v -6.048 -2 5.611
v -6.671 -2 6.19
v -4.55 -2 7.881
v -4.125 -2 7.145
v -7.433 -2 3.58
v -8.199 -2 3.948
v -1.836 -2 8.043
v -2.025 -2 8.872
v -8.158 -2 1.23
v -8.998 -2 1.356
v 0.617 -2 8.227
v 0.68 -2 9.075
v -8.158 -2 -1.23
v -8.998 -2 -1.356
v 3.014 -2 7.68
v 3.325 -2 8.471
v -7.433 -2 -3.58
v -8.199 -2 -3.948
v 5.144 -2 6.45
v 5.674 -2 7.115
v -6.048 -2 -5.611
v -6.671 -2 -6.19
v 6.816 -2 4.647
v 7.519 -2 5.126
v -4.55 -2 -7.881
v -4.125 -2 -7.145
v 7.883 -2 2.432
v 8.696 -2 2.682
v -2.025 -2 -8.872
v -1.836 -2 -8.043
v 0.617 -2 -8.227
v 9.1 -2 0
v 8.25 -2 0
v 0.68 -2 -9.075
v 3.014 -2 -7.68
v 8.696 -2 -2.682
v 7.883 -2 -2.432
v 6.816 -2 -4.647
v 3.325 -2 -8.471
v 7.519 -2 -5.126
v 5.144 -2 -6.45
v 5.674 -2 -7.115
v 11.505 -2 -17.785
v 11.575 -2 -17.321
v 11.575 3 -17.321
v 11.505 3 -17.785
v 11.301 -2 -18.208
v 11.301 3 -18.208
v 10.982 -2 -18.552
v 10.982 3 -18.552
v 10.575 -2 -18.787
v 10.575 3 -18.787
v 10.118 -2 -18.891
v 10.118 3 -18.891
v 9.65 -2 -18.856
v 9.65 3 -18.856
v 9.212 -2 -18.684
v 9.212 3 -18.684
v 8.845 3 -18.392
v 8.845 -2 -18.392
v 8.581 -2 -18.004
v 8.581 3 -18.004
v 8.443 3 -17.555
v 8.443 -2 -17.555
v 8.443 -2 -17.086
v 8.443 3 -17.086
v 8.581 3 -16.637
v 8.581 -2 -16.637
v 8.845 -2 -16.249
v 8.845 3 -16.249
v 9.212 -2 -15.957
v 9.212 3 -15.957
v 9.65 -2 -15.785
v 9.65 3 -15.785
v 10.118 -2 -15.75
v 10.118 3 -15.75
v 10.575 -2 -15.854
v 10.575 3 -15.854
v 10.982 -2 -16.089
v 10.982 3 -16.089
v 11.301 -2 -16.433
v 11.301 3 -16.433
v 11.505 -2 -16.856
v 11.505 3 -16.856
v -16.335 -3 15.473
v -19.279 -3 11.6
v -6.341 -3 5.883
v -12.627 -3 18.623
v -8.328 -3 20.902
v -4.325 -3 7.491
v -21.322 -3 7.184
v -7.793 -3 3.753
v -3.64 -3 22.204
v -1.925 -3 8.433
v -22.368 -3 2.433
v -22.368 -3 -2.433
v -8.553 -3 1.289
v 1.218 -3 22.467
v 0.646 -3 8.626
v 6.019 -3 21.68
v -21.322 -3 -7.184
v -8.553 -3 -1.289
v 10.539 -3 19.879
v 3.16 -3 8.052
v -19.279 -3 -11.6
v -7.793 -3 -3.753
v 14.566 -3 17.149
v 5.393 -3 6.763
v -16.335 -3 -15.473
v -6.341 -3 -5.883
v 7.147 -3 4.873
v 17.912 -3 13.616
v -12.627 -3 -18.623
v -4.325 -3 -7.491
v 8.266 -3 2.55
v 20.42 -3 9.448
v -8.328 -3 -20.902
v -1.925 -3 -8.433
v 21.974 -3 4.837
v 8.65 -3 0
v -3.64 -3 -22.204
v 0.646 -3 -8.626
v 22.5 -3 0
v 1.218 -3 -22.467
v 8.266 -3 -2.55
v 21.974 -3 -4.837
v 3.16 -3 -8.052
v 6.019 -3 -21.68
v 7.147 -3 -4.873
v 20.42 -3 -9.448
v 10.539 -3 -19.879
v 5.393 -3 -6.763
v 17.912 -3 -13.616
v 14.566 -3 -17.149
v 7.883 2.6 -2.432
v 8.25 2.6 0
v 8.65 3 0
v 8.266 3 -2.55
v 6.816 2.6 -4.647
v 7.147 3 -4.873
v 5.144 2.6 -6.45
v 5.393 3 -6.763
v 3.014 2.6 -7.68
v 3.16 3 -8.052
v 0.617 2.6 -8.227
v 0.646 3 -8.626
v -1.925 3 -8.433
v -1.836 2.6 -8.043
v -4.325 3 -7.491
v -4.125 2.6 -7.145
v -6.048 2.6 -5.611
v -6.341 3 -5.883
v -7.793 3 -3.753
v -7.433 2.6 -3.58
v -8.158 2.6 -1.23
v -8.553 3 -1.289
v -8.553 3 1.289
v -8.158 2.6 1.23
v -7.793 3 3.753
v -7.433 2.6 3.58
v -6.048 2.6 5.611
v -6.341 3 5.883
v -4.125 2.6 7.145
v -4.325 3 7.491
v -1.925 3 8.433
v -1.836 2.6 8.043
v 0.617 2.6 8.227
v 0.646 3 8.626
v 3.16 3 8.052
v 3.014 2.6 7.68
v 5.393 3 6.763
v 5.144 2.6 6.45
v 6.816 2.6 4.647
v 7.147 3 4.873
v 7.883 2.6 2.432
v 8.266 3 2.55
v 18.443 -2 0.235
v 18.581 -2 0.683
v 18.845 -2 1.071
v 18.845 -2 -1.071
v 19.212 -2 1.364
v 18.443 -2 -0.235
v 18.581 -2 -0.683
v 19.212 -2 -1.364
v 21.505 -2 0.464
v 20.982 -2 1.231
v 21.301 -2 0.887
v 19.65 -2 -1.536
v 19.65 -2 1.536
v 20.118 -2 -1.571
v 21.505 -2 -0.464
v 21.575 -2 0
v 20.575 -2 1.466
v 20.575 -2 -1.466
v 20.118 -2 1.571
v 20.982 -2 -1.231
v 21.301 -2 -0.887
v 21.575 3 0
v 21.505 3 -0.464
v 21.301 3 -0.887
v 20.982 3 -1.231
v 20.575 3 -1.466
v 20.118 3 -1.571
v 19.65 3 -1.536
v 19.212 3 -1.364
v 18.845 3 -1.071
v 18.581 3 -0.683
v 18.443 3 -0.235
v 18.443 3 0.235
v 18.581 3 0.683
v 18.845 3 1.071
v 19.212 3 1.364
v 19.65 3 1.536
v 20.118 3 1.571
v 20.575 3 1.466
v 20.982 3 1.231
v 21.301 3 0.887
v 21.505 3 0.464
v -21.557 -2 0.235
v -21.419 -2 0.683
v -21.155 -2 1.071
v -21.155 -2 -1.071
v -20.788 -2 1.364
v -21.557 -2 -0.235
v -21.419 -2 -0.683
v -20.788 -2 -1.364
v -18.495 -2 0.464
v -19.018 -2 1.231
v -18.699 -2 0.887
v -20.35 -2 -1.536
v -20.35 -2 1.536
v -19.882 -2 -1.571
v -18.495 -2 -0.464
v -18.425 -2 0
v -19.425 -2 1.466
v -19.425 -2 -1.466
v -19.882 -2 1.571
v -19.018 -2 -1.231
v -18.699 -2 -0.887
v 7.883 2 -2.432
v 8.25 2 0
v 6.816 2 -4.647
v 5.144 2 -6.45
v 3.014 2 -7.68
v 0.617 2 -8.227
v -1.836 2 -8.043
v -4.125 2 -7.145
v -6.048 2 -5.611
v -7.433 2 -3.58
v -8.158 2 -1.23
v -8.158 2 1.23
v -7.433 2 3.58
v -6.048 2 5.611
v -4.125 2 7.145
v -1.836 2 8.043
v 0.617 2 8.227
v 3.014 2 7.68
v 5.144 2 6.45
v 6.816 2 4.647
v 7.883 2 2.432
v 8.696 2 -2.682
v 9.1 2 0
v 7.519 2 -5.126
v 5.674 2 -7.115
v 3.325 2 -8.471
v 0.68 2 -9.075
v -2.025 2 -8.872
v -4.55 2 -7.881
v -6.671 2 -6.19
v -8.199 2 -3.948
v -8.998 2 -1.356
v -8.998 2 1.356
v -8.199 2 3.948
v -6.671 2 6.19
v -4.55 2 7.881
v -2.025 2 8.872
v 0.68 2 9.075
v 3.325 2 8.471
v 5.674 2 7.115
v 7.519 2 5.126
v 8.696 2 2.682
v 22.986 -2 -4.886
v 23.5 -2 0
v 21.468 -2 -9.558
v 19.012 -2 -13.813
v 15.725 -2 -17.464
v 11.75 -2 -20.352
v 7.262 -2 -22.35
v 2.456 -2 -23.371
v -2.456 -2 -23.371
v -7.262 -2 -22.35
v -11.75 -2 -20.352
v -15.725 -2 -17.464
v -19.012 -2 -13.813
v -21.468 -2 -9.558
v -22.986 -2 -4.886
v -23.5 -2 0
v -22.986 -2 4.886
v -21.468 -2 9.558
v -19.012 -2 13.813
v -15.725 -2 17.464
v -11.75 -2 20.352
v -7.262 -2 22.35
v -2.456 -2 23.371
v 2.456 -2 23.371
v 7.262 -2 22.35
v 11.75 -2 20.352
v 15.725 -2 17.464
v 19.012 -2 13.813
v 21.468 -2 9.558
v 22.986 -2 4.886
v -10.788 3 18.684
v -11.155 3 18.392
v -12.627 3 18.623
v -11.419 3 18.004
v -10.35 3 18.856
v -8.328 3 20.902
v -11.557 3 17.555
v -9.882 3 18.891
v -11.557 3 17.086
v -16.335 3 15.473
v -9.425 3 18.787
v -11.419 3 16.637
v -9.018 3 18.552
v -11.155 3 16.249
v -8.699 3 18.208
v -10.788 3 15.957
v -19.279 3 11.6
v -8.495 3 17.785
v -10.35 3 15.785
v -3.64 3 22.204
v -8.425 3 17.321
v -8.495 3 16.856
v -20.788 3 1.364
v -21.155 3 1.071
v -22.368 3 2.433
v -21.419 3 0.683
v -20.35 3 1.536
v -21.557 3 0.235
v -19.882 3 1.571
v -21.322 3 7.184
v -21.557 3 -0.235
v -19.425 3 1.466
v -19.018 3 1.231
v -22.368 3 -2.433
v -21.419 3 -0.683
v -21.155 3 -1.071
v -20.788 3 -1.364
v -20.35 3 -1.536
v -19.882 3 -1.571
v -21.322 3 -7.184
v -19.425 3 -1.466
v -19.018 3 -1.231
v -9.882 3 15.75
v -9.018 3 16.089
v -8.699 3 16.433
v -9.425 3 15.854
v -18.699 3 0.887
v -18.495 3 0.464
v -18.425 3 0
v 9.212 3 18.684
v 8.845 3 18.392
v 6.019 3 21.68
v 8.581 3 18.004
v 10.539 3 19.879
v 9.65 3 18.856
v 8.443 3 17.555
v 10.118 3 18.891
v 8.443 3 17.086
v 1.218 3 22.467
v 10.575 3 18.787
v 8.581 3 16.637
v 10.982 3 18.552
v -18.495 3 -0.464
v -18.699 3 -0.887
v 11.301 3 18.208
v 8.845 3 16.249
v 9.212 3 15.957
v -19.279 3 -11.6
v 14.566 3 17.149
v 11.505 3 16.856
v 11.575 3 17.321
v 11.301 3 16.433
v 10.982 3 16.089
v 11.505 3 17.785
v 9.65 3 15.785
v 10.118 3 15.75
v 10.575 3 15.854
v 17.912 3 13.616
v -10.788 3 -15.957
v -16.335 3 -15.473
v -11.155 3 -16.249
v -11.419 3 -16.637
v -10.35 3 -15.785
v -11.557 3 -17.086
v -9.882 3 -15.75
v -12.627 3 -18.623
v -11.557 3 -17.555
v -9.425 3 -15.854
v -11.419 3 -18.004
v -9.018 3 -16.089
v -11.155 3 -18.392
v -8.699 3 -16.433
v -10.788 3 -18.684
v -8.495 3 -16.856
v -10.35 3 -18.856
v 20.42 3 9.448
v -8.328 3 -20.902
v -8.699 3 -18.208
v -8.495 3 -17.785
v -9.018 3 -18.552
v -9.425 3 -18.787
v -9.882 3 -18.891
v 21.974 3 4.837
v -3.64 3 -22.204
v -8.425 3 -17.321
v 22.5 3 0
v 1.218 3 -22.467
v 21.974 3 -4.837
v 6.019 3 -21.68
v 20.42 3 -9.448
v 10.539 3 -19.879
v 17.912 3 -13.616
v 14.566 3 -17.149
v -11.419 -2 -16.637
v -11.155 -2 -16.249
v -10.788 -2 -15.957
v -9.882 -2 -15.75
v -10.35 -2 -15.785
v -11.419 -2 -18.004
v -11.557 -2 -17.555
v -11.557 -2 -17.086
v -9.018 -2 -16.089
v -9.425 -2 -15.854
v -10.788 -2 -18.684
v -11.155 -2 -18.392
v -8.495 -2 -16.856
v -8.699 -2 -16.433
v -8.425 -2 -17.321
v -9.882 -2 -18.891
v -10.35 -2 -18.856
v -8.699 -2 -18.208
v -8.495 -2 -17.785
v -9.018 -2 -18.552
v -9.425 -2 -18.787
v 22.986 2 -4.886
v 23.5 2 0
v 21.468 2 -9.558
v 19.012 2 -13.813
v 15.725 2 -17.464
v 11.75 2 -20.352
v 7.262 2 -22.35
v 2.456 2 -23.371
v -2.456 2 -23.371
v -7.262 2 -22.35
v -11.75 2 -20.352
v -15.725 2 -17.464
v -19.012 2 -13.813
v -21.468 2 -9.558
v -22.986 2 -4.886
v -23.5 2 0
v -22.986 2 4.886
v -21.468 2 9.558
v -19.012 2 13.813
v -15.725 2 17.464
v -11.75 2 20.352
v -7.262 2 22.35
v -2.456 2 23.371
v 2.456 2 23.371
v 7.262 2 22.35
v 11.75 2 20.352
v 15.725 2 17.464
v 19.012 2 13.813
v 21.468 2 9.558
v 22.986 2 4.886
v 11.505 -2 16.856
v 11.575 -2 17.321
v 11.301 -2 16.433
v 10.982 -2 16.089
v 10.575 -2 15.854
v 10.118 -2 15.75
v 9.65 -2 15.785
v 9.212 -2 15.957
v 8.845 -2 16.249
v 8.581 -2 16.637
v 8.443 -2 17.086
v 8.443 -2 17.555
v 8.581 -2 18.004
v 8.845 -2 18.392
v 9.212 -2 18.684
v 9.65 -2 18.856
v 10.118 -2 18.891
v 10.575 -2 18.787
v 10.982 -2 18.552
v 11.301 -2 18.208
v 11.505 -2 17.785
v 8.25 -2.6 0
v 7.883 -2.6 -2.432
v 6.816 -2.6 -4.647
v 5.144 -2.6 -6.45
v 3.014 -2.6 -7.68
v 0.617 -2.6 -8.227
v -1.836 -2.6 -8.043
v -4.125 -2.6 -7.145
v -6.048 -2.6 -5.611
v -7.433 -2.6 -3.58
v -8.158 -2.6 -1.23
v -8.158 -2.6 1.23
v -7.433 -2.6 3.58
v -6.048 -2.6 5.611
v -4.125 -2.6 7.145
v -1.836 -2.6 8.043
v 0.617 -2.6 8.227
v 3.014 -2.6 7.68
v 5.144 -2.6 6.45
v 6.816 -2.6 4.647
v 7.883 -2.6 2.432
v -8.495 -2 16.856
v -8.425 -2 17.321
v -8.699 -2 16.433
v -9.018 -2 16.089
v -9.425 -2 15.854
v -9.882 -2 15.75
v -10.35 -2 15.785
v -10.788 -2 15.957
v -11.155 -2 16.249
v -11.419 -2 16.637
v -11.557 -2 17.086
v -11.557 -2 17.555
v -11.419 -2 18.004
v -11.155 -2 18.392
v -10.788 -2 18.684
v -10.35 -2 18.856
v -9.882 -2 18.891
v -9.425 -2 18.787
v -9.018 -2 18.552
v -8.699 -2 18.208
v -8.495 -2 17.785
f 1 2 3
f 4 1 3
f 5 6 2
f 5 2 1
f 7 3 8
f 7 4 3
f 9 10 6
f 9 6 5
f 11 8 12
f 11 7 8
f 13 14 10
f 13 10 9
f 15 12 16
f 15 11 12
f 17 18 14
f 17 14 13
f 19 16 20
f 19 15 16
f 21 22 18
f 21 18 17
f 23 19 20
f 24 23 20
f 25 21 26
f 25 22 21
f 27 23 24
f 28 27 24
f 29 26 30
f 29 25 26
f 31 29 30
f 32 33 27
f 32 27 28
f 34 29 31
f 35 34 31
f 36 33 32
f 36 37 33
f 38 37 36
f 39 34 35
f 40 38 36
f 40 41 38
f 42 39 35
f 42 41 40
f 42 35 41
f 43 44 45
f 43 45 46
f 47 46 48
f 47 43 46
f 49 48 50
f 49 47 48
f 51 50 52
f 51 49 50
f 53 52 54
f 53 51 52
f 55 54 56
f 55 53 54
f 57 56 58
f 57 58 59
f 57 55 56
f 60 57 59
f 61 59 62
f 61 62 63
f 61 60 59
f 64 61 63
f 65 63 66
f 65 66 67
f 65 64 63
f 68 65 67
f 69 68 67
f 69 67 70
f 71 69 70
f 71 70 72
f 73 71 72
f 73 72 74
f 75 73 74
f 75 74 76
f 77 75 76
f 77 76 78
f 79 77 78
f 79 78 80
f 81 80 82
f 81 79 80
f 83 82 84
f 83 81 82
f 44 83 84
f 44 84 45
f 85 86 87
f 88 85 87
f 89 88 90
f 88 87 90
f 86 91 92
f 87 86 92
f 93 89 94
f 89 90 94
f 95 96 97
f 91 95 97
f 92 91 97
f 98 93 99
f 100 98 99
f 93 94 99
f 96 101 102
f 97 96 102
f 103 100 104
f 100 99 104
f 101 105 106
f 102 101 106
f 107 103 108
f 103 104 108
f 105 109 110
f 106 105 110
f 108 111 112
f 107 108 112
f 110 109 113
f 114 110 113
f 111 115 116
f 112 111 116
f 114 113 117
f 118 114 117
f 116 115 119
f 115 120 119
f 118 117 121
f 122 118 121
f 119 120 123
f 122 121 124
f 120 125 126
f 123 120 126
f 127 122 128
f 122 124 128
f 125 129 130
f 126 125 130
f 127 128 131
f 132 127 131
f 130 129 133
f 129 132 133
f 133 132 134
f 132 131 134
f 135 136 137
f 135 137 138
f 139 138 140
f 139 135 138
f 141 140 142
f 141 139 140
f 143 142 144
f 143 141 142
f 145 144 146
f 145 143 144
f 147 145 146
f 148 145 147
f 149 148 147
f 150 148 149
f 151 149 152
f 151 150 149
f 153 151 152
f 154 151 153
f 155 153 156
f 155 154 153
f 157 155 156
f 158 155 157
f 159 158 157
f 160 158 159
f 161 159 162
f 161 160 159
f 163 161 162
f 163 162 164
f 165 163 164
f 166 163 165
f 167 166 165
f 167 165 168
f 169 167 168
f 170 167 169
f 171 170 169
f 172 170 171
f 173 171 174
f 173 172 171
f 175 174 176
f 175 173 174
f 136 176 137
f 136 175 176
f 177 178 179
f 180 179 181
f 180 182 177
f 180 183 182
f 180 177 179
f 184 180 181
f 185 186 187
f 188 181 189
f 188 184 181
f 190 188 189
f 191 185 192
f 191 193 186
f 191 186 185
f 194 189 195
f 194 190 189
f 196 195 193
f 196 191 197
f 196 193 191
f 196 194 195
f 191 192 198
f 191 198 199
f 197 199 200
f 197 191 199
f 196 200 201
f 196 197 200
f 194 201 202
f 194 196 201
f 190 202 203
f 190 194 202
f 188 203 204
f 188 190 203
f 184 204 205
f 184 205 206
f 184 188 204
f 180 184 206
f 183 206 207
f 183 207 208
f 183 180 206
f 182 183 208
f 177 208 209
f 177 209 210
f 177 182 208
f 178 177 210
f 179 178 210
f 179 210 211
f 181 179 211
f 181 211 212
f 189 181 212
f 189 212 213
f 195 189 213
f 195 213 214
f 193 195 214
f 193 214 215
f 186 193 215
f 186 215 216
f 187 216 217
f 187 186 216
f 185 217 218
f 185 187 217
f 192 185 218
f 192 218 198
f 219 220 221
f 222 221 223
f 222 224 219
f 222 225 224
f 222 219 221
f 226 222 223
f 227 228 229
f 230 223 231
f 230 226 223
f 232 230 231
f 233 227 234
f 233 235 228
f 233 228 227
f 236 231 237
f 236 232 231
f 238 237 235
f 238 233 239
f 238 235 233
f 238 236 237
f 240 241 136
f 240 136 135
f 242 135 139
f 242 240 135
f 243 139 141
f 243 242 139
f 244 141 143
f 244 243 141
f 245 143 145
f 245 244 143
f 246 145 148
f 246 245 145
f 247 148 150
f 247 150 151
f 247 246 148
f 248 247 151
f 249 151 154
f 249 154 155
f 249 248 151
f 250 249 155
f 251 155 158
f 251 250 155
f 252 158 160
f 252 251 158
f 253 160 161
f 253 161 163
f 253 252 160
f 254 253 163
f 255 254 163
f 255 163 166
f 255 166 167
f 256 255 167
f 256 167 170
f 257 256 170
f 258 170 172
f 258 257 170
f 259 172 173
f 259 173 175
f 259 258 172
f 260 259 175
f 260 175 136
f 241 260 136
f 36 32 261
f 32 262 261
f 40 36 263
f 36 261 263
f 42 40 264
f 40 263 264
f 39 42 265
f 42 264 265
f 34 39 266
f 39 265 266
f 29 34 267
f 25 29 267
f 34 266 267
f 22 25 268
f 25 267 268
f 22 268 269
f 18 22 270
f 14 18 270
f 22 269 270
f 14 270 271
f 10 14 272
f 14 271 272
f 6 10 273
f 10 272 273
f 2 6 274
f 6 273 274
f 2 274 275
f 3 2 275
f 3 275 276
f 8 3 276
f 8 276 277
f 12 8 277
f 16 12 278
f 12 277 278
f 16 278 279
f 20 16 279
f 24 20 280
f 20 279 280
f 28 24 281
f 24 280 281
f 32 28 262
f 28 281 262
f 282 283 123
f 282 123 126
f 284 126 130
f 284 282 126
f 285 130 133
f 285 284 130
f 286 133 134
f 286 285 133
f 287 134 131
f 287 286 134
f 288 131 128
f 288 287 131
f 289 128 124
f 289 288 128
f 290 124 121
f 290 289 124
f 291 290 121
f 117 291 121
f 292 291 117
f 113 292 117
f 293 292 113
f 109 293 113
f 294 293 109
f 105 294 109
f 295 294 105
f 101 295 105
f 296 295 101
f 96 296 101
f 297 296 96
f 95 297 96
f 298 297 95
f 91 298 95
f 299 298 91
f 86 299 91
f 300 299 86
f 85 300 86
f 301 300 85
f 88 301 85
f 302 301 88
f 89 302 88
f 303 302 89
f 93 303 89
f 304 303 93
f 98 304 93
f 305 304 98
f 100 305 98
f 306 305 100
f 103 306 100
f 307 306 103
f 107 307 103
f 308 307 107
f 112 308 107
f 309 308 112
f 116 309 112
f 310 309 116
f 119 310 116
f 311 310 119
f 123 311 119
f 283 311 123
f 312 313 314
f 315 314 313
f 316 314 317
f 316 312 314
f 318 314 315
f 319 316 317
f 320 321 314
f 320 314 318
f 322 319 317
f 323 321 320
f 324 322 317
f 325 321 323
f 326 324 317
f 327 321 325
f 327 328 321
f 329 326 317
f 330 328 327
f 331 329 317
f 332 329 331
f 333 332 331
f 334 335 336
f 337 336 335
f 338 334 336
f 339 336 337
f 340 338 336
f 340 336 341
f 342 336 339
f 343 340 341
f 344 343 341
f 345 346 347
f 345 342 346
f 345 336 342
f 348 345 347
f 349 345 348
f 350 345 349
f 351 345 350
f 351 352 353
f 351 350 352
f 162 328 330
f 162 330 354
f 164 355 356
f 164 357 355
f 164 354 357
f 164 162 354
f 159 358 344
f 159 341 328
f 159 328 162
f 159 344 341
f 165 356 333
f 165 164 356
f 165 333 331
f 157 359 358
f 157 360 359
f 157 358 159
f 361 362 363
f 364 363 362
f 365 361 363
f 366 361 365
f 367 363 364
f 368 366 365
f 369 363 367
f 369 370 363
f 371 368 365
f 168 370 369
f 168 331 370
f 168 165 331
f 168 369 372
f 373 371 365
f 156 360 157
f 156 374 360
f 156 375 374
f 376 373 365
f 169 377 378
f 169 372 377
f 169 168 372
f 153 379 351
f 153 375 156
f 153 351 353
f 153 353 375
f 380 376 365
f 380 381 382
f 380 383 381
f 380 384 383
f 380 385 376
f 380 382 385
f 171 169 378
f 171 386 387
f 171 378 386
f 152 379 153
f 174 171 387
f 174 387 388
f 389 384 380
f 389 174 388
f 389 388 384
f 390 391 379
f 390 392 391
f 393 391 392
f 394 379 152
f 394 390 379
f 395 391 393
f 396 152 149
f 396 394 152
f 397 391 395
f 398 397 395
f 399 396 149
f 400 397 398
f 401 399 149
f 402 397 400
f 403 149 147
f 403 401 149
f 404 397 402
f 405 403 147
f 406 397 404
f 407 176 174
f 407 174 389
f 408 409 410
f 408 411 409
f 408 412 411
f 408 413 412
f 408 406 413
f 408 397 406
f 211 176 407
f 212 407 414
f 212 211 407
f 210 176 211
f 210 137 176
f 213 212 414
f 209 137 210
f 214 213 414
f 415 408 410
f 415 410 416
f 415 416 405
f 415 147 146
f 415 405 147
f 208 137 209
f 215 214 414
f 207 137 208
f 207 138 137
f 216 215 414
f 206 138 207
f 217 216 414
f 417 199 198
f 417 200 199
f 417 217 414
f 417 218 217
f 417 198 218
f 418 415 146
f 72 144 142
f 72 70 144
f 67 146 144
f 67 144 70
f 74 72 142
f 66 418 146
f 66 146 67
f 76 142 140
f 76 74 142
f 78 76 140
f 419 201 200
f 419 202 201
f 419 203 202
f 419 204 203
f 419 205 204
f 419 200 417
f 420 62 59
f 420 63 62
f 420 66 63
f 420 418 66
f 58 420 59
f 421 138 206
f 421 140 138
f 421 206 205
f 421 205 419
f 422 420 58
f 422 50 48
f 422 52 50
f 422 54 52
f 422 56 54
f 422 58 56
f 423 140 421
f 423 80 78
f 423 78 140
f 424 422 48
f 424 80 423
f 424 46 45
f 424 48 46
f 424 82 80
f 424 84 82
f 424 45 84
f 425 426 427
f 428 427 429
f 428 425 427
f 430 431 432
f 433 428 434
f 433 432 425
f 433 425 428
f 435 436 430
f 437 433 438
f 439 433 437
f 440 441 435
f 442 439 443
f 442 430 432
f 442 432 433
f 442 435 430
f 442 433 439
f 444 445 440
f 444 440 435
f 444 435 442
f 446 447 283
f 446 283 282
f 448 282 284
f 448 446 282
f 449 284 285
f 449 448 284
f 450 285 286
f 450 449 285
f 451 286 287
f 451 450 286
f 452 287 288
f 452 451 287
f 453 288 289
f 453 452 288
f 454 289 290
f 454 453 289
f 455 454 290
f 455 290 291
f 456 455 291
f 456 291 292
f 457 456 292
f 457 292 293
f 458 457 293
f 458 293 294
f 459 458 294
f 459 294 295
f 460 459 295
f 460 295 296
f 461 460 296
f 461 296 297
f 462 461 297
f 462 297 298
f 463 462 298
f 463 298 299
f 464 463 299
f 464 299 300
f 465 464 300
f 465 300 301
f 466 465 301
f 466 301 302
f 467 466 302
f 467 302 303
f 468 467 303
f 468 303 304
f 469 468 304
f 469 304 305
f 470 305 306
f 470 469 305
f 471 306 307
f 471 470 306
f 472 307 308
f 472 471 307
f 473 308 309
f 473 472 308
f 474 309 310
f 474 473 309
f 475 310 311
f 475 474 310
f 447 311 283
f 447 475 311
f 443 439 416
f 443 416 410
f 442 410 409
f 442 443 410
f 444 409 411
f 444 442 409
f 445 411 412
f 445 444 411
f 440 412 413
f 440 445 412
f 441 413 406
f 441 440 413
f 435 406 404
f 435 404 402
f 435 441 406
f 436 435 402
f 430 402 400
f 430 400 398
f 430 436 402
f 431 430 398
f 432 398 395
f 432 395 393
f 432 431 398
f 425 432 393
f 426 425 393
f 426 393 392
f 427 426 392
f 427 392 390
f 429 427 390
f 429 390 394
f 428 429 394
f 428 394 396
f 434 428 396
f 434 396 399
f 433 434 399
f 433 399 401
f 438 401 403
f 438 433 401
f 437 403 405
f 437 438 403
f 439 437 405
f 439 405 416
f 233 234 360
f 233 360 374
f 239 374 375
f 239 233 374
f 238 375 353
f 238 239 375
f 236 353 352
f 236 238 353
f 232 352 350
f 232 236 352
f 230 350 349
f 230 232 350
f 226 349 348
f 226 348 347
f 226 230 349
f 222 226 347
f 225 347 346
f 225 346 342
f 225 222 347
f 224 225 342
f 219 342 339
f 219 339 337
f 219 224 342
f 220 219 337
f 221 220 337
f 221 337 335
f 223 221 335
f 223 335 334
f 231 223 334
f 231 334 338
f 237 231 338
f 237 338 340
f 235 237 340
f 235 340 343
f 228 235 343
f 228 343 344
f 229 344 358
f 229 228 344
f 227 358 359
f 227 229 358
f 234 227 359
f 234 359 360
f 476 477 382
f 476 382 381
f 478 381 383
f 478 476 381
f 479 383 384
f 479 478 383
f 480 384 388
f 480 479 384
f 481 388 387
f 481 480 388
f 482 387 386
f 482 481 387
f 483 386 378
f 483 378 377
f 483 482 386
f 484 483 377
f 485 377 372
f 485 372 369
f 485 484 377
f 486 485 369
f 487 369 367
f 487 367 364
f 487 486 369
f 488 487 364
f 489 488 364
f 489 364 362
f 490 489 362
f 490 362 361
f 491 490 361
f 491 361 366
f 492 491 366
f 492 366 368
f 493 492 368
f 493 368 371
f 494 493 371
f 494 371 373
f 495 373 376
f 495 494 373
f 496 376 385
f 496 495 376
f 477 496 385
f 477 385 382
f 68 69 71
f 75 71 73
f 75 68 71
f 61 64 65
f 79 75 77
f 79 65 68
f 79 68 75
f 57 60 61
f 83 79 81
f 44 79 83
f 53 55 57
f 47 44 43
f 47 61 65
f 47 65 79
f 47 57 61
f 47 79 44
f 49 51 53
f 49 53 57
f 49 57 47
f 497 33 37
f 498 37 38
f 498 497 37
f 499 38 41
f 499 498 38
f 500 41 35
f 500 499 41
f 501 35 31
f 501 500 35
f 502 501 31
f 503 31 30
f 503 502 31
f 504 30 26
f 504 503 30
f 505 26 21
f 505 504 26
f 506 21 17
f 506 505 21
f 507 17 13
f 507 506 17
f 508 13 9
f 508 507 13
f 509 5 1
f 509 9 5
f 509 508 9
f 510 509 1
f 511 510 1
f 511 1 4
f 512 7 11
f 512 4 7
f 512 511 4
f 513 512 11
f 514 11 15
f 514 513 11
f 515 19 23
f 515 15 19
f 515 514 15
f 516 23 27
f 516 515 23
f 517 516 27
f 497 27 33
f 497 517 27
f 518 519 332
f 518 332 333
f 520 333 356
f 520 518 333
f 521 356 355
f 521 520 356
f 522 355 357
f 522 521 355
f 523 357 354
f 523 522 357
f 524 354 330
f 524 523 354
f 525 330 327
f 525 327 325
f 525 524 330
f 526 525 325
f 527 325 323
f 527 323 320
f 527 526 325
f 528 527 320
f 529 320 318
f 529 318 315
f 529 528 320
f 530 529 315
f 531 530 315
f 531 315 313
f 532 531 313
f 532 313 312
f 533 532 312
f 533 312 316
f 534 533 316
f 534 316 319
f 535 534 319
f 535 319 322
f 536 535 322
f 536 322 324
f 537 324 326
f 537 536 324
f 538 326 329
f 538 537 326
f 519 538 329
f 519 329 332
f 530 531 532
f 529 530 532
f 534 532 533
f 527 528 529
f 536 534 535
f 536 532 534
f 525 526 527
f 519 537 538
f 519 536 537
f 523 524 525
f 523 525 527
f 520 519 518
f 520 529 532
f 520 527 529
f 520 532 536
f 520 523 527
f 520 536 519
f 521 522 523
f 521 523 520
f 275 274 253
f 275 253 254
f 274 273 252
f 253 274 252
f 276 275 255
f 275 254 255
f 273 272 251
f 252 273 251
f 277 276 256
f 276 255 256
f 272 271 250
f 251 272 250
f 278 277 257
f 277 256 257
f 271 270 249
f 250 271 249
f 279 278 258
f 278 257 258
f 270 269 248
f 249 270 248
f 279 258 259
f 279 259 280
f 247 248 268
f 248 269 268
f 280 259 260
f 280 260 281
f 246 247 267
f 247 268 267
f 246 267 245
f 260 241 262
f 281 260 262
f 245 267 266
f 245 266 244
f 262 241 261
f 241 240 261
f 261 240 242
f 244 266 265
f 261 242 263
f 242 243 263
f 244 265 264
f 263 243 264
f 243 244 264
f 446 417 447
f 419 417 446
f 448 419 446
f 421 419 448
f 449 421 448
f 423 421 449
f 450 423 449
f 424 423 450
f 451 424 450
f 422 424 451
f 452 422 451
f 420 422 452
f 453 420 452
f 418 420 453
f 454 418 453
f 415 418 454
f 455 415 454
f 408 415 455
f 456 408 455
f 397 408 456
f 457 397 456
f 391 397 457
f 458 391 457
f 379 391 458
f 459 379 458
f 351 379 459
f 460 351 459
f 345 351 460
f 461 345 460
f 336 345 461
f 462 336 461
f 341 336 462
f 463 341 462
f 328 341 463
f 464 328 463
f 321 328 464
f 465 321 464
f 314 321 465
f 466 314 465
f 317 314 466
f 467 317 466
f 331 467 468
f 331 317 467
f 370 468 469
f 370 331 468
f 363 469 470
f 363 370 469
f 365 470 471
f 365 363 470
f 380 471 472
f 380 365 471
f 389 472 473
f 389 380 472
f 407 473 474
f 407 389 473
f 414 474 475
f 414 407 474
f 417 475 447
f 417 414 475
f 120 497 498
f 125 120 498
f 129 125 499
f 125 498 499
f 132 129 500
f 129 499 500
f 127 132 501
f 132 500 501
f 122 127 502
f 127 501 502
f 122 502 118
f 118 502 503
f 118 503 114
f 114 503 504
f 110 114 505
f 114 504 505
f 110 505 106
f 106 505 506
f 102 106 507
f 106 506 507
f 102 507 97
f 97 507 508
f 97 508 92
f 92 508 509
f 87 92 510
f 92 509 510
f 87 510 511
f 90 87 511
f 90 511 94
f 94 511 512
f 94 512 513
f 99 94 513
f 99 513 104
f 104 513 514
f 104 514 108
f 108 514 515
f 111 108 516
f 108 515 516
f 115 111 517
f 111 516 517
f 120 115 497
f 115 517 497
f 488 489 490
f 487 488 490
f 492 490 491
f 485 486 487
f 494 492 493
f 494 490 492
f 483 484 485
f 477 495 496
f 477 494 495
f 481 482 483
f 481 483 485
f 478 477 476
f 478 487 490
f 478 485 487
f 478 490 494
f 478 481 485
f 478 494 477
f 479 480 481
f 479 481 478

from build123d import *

# Parameters (mm, degrees)
SKETCH1_R           = 23.5
SKETCH1_R_2         = 1.575
SKETCH1_R_3         = 8.25
BOSS_EXTRUDE1_DEPTH = 3
SKETCH2_R           = 9.1
CUT_EXTRUDE1_DEPTH  = 2
SKETCH3_R           = 21.575
SKETCH3_R_2         = 18.425
BOSS_EXTRUDE2_DEPTH = 1
CHAMFER1_SIZE       = 1
CHAMFER2_SIZE       = 0.4


with BuildPart() as part:
    # Sketch1 → Boss-Extrude1 (new body, symmetric)
    with BuildSketch(Plane(origin=(0, 0, 0), x_dir=(1, 0, 0), z_dir=(0, 1, 0))):
        Circle(SKETCH1_R)
        with Locations((20, 0)):
            Circle(SKETCH1_R_2, mode=Mode.SUBTRACT)
        with Locations((10, -17.320508076)):
            Circle(SKETCH1_R_2, mode=Mode.SUBTRACT)
        with Locations((-10, -17.320508076)):
            Circle(SKETCH1_R_2, mode=Mode.SUBTRACT)
        with Locations((-20, 0)):
            Circle(SKETCH1_R_2, mode=Mode.SUBTRACT)
        with Locations((-10, 17.320508076)):
            Circle(SKETCH1_R_2, mode=Mode.SUBTRACT)
        with Locations((10, 17.320508076)):
            Circle(SKETCH1_R_2, mode=Mode.SUBTRACT)
        Circle(SKETCH1_R_3, mode=Mode.SUBTRACT)
    extrude(amount=BOSS_EXTRUDE1_DEPTH, both=True)

    # Sketch2 → Cut-Extrude1 (cut, symmetric)
    with BuildSketch(Plane(origin=(0, 0, 0), x_dir=(1, 0, 0), z_dir=(0, 1, 0))):
        Circle(SKETCH2_R)
    extrude(amount=CUT_EXTRUDE1_DEPTH, both=True, mode=Mode.SUBTRACT)

    # Sketch3 → Boss-Extrude2 (add)
    with BuildSketch(Plane(origin=(0, -3, 0), x_dir=(1, 0, 0), z_dir=(0, 1, 0))):
        Circle(SKETCH3_R)
        Circle(SKETCH3_R_2, mode=Mode.SUBTRACT)
    extrude(amount=BOSS_EXTRUDE2_DEPTH)

    # Chamfer1
    chamfer1_edges = [part.edges().sort_by_distance(p)[0] for p in [
        (-23.5, -3, 0),
        (-23.5, 3, 0),
    ]]
    chamfer(chamfer1_edges, length=CHAMFER1_SIZE)

    # Chamfer2
    chamfer2_edges = [part.edges().sort_by_distance(p)[0] for p in [
        (-8.25, -3, 0),
        (-8.25, 3, 0),
    ]]
    chamfer(chamfer2_edges, length=CHAMFER2_SIZE)


solid = part.part
